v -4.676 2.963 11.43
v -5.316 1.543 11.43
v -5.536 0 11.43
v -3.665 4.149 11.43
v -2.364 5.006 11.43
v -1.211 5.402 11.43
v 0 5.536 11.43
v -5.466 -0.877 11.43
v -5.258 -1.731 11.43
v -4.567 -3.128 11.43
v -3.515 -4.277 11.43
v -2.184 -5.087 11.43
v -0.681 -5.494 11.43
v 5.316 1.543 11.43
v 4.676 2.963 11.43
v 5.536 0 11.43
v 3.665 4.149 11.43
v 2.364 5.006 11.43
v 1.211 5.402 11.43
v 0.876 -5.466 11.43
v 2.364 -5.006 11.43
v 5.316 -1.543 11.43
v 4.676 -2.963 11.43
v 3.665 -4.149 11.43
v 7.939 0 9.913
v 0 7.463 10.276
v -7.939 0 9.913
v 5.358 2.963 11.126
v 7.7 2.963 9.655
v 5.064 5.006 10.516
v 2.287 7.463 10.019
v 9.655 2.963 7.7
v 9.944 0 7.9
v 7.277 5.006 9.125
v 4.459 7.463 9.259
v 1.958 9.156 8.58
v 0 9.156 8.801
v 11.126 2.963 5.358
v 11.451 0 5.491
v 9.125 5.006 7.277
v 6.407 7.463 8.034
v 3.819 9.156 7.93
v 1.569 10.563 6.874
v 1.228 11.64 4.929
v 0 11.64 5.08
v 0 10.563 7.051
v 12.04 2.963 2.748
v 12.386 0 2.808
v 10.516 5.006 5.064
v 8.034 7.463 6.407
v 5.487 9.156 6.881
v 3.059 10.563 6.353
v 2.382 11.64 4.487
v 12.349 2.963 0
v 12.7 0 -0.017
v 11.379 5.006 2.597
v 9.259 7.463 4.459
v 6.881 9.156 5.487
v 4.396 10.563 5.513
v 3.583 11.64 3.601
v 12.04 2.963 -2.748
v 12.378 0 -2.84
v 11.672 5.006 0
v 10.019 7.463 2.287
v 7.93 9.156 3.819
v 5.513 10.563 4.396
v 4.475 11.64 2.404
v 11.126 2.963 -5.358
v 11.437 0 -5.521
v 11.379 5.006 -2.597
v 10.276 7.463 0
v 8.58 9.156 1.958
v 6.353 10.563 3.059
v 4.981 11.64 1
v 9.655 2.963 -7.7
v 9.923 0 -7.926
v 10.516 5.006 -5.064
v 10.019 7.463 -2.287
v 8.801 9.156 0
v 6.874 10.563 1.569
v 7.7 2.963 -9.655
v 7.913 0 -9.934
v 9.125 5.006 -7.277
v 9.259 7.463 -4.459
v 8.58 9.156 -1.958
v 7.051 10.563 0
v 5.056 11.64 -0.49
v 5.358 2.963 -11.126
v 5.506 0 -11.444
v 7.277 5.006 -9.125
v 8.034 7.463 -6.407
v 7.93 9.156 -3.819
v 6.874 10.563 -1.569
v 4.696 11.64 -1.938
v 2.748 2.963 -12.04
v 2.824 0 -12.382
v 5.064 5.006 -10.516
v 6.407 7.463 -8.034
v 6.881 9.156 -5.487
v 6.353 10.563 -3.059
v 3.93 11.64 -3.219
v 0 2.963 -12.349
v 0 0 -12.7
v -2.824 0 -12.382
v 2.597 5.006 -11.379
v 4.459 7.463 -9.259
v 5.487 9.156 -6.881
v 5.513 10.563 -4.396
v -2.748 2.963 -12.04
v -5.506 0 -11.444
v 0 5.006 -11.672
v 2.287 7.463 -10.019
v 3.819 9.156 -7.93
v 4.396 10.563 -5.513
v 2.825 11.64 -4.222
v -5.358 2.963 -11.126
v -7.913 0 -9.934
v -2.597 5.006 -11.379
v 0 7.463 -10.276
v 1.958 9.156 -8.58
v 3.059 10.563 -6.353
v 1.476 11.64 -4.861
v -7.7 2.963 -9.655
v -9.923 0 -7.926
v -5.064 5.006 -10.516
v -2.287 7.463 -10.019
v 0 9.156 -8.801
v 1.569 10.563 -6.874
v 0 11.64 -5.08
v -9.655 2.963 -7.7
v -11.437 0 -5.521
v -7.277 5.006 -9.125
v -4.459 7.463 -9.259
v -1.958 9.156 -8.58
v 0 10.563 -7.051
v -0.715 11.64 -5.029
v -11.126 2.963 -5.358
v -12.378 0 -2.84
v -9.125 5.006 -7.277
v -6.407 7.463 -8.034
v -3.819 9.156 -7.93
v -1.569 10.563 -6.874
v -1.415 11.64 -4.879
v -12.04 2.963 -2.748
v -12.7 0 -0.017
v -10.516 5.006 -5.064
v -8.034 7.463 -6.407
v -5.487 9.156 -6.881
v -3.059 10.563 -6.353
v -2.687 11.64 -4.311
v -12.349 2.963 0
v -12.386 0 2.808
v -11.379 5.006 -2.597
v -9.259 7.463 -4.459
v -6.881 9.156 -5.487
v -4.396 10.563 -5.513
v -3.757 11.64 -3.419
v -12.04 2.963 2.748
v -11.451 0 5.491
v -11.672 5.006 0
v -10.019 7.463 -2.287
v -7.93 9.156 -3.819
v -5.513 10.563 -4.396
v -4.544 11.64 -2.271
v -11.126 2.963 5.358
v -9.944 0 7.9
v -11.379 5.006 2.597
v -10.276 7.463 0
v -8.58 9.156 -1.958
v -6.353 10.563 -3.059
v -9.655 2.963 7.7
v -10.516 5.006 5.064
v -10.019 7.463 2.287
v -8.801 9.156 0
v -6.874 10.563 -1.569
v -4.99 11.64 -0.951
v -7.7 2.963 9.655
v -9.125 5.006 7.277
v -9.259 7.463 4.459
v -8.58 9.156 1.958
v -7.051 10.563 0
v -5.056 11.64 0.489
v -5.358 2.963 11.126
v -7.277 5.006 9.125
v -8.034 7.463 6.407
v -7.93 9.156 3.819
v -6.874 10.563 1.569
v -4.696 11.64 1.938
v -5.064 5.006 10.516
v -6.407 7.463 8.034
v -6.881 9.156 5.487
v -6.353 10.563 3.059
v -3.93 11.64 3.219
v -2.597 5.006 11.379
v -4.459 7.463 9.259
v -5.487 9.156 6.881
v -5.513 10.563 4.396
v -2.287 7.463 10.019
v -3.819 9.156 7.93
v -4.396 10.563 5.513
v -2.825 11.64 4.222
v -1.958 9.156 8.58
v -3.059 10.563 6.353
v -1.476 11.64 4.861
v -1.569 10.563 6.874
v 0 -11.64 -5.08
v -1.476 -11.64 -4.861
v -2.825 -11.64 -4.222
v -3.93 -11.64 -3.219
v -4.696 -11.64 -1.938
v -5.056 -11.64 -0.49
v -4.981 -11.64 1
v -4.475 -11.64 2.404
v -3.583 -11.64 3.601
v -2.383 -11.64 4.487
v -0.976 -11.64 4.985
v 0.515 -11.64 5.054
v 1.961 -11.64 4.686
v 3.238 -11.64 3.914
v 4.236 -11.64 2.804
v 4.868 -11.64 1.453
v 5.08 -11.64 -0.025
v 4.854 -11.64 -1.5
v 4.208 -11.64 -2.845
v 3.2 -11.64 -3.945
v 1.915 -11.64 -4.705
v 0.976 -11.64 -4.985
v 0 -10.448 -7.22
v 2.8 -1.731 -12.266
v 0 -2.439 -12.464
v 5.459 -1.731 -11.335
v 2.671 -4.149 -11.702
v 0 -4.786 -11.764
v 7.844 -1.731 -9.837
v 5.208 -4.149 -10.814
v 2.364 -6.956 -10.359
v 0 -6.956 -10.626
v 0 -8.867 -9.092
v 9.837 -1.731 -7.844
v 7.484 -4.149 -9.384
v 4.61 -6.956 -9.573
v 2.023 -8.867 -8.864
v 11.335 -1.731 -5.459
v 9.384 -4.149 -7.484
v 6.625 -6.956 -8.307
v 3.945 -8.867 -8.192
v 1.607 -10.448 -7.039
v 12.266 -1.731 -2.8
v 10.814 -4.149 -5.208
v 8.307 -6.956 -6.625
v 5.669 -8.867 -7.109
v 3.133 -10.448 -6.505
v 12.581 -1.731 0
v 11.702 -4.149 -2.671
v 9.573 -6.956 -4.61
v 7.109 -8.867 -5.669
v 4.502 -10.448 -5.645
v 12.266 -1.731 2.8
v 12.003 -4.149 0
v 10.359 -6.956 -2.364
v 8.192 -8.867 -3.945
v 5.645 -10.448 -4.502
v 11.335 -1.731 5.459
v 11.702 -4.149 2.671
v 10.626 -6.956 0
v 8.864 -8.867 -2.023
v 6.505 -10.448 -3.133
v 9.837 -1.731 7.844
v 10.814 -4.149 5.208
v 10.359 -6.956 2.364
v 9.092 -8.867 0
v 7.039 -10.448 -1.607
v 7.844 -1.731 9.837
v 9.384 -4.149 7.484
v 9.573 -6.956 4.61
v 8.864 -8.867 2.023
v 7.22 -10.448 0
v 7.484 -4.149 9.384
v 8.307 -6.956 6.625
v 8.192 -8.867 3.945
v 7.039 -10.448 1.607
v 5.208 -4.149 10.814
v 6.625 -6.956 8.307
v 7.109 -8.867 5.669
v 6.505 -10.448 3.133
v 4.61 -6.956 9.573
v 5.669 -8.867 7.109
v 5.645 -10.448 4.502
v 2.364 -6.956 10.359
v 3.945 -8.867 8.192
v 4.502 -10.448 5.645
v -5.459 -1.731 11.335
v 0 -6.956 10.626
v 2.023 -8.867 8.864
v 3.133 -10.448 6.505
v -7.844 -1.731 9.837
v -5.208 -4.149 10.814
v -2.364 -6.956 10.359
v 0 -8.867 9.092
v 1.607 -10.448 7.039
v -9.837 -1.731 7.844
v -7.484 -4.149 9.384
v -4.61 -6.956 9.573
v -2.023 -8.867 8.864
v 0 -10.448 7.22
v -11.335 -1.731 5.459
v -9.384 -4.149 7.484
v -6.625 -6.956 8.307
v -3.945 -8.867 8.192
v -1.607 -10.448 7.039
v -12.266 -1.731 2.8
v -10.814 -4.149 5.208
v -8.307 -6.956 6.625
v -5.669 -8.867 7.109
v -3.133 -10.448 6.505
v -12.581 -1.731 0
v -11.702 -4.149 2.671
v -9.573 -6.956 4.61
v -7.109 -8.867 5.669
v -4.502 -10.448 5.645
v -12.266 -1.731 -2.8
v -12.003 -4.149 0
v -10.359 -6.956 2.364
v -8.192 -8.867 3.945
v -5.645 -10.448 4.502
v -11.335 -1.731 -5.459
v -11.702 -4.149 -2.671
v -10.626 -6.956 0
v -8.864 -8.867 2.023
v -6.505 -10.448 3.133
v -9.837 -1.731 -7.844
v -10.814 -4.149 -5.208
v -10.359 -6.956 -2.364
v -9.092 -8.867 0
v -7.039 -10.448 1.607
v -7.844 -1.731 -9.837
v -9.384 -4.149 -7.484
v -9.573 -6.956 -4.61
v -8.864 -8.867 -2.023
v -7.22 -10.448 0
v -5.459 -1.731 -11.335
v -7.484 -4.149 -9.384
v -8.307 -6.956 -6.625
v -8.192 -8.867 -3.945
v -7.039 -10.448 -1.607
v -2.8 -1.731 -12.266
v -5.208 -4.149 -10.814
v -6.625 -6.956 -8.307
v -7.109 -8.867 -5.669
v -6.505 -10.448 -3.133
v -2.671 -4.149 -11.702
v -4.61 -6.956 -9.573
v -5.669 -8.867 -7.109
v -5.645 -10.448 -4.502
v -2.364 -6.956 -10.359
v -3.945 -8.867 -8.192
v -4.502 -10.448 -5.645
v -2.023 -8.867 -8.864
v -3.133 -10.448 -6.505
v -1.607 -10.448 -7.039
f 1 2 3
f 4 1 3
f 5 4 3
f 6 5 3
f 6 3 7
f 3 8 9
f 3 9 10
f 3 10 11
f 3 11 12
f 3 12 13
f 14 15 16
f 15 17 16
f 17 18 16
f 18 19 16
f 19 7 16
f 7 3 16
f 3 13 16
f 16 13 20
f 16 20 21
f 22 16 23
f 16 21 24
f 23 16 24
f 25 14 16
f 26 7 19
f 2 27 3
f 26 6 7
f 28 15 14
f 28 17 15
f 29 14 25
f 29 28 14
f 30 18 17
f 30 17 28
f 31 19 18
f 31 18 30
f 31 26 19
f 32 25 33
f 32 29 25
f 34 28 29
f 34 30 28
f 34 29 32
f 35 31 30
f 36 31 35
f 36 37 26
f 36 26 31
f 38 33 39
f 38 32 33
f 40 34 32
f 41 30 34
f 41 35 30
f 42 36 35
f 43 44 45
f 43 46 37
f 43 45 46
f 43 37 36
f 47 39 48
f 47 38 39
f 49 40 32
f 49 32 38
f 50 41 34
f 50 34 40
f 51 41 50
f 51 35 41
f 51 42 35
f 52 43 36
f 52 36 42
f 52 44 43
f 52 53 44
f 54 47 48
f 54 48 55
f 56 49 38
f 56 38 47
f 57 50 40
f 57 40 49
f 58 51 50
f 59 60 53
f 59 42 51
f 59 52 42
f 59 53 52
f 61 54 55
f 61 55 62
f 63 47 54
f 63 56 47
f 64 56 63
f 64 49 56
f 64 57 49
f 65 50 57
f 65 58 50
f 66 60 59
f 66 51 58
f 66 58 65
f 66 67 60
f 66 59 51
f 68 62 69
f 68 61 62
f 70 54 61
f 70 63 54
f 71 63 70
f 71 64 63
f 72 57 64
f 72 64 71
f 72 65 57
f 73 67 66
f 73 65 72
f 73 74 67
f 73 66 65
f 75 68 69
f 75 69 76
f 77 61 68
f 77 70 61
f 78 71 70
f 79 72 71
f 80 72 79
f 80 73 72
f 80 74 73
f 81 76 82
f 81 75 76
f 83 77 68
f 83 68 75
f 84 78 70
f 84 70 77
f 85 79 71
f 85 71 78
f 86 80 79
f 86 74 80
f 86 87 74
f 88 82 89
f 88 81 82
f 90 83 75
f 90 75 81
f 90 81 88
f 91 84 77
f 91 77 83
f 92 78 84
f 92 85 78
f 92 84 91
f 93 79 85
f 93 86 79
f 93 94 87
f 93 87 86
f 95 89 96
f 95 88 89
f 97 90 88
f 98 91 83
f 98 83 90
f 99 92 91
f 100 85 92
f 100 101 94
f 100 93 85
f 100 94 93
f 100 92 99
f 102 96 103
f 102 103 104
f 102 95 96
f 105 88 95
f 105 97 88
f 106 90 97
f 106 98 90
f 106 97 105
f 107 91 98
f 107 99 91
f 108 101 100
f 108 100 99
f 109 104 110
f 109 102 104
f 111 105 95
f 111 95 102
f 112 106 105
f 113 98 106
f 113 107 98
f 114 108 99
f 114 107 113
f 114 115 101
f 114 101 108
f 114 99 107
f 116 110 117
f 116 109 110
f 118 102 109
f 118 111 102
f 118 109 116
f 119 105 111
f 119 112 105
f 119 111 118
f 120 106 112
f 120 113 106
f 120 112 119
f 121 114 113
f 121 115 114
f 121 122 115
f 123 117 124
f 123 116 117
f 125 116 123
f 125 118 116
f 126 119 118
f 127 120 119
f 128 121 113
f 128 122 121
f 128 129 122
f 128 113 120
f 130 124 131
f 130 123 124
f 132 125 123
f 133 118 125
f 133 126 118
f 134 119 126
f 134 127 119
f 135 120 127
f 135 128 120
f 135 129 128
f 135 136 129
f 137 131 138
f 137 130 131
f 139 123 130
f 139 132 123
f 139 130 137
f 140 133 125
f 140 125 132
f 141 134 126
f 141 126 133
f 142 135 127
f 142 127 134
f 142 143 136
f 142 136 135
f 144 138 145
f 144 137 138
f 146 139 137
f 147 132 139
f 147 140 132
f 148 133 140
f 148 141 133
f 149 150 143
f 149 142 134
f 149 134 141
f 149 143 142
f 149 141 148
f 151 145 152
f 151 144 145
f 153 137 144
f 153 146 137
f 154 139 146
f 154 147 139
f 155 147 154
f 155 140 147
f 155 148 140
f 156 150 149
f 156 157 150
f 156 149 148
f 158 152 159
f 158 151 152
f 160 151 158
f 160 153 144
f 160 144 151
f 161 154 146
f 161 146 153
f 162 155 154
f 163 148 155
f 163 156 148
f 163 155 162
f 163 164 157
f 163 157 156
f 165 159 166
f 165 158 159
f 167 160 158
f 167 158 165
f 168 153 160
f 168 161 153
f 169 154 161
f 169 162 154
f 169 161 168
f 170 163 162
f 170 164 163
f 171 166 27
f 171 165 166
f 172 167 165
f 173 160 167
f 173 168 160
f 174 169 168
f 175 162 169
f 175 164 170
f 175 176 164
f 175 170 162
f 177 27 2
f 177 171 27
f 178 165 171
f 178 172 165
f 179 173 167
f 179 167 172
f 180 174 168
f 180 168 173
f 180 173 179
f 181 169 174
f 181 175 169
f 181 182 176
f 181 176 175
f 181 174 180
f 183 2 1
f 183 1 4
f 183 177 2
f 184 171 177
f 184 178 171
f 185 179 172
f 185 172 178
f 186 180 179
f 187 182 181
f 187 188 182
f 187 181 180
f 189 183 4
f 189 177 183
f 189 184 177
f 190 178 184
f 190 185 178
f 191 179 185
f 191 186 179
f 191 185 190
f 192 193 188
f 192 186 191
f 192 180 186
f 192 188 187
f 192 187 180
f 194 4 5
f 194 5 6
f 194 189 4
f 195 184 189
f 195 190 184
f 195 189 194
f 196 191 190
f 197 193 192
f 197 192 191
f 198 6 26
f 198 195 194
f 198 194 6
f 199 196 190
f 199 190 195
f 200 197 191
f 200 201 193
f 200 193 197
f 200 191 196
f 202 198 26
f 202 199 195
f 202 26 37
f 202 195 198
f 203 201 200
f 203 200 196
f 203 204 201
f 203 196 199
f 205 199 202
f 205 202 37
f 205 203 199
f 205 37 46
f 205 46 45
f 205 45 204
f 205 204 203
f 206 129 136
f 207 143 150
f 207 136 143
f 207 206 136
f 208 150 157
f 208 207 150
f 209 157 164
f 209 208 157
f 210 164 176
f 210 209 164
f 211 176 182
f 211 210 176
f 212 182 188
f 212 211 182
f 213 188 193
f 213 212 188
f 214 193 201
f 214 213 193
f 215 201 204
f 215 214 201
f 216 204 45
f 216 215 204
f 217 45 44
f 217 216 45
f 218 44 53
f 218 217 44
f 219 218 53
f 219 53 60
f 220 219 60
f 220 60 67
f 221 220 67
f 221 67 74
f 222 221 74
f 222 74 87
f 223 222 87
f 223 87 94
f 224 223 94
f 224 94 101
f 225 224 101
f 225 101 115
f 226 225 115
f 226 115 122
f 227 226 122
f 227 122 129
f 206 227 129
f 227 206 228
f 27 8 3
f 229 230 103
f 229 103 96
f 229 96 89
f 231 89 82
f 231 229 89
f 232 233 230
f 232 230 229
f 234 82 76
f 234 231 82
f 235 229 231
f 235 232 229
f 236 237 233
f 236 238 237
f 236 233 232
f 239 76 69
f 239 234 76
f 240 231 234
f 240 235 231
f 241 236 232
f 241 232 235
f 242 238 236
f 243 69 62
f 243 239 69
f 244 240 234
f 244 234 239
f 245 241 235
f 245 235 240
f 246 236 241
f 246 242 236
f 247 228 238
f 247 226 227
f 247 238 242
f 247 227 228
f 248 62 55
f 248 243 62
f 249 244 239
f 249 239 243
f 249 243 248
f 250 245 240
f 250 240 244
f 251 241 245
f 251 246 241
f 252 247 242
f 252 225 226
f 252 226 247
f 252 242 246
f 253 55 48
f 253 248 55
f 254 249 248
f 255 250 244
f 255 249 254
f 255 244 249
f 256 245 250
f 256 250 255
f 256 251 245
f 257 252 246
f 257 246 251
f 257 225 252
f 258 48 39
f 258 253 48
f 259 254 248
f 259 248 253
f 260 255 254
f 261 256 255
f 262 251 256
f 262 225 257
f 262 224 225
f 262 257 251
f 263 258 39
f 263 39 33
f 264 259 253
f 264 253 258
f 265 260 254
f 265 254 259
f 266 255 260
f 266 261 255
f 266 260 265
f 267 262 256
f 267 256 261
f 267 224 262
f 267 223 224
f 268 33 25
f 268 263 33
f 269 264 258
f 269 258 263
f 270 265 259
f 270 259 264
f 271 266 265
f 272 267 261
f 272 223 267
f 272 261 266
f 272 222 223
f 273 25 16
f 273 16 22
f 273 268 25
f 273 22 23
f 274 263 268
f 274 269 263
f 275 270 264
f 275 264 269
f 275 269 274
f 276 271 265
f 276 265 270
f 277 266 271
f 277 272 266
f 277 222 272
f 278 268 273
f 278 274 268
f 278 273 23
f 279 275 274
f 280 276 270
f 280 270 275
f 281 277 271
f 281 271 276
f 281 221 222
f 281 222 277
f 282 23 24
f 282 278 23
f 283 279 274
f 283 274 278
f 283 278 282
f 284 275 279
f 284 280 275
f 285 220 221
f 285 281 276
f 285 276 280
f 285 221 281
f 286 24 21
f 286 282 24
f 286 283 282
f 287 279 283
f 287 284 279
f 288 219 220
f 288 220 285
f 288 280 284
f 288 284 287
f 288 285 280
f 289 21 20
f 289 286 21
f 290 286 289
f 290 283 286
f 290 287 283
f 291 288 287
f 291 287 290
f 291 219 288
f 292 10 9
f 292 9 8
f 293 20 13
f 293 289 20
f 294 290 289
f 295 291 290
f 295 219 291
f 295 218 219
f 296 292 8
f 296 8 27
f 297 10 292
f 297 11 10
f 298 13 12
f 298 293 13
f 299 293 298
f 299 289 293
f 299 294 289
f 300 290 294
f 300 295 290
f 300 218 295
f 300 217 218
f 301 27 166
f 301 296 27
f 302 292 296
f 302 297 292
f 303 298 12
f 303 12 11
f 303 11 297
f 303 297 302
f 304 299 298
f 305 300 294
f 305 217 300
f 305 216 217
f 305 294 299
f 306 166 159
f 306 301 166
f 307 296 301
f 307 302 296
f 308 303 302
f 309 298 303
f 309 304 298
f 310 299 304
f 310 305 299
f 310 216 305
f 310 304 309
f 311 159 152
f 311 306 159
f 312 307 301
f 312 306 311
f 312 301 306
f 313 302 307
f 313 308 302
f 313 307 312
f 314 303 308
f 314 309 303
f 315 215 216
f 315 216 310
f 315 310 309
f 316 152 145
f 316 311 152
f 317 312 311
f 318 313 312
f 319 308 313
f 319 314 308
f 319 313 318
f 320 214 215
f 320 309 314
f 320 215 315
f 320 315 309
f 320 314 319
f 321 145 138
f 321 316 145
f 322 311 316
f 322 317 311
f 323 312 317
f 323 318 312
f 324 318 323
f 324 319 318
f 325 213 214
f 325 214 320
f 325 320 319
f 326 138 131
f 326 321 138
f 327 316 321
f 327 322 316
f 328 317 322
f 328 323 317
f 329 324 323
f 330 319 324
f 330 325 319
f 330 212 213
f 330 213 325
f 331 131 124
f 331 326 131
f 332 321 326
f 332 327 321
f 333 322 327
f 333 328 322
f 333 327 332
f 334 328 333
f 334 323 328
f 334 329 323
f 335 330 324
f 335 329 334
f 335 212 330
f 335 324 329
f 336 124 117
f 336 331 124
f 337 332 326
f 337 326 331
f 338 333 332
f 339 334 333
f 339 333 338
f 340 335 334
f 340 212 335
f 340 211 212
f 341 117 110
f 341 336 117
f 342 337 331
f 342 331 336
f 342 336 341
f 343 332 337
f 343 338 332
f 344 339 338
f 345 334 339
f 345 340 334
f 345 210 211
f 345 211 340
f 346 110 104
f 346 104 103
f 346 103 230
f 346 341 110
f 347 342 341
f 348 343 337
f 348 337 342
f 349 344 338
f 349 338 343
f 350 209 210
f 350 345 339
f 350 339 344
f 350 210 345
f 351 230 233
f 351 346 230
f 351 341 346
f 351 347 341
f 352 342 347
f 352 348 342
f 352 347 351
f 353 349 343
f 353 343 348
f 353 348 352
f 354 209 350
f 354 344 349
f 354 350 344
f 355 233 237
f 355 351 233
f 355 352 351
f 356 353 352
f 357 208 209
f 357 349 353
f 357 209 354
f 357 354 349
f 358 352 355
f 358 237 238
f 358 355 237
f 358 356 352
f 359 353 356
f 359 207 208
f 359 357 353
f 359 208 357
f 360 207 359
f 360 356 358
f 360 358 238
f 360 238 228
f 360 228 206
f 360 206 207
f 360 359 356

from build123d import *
from build123d.topology import SkipClean

# Parameters (mm, degrees)
SKETCH1_R               = 12.7
BOSS_EXTRUDE1_DEPTH     = 12.7
FILLET1_R               = 12.7
BOSS_EXTRUDE2_START     = 12.7
SKETCH2_R               = 12.7
BOSS_EXTRUDE2_DEPTH     = 12.7
FILLET2_R               = 12.7
CUT_EXTRUDE1_DEPTH      = 22.997045372
CUT_EXTRUDE1_DEPTH_BACK = 22.997045372
SKETCH3_R               = 5.08
CUT_EXTRUDE2_DEPTH      = 22.402439379
CUT_EXTRUDE2_DEPTH_BACK = 22.402439379
SKETCH5_W               = 27.579814606
SKETCH5_H               = 6.012661004


with BuildPart() as part:
    # Sketch1 → Boss-Extrude1 (new body)
    with BuildSketch(Plane(origin=(0, 0, 0), x_dir=(1, 0, 0), z_dir=(0, 1, 0))):
        with Locations(Location((0, 0, 0), (0, 0, 270))):
            Circle(SKETCH1_R)
    extrude(amount=BOSS_EXTRUDE1_DEPTH)

    # Fillet1
    fillet1_edges = [part.edges().sort_by_distance(p)[0] for p in [
        (0, 12.7, -12.7),
    ]]
    fillet(fillet1_edges, radius=FILLET1_R - 0.0001)  # a hair under: the kernel refuses the full size

    # Sketch2 → Boss-Extrude2 (add)
    with SkipClean():  # the faces are left unmerged after this step: merging them gives an invalid solid
        with BuildSketch(Plane.XZ.offset(BOSS_EXTRUDE2_START)):
            with Locations(Location((0, 0, 0), (0, 0, 270))):
                Circle(SKETCH2_R)
        extrude(amount=-BOSS_EXTRUDE2_DEPTH)

    # Fillet2
    fillet2_edges = [part.edges().sort_by_distance(p)[0] for p in [
        (0, -12.7, 12.7),
    ]]
    fillet(fillet2_edges, radius=FILLET2_R - 0.0001)  # a hair under: the kernel refuses the full size

    # Sketch3 → Cut-Extrude1 (cut, two sides: drawn at the far end of the back side and taken through both)
    with BuildSketch(Plane(origin=(0, 0, 0), x_dir=(1, 0, 0), z_dir=(0, 1, 0)).offset(-CUT_EXTRUDE1_DEPTH_BACK)):
        with Locations(Location((0, 0, 0), (0, 0, 90))):
            Circle(SKETCH3_R)
    extrude(amount=CUT_EXTRUDE1_DEPTH + CUT_EXTRUDE1_DEPTH_BACK, mode=Mode.SUBTRACT)

    # Sketch5 → Cut-Extrude2 (cut, two sides: drawn at the far end of the back side and taken through both)
    with BuildSketch(Plane(origin=(0, 0, 0), x_dir=(1, 0, 0), z_dir=(0, 1, 0)).offset(-CUT_EXTRUDE2_DEPTH_BACK)):
        with Locations((0.71890512, -14.436330502)):
            Rectangle(SKETCH5_W, SKETCH5_H)
    extrude(amount=CUT_EXTRUDE2_DEPTH + CUT_EXTRUDE2_DEPTH_BACK, mode=Mode.SUBTRACT)


solid = part.part
